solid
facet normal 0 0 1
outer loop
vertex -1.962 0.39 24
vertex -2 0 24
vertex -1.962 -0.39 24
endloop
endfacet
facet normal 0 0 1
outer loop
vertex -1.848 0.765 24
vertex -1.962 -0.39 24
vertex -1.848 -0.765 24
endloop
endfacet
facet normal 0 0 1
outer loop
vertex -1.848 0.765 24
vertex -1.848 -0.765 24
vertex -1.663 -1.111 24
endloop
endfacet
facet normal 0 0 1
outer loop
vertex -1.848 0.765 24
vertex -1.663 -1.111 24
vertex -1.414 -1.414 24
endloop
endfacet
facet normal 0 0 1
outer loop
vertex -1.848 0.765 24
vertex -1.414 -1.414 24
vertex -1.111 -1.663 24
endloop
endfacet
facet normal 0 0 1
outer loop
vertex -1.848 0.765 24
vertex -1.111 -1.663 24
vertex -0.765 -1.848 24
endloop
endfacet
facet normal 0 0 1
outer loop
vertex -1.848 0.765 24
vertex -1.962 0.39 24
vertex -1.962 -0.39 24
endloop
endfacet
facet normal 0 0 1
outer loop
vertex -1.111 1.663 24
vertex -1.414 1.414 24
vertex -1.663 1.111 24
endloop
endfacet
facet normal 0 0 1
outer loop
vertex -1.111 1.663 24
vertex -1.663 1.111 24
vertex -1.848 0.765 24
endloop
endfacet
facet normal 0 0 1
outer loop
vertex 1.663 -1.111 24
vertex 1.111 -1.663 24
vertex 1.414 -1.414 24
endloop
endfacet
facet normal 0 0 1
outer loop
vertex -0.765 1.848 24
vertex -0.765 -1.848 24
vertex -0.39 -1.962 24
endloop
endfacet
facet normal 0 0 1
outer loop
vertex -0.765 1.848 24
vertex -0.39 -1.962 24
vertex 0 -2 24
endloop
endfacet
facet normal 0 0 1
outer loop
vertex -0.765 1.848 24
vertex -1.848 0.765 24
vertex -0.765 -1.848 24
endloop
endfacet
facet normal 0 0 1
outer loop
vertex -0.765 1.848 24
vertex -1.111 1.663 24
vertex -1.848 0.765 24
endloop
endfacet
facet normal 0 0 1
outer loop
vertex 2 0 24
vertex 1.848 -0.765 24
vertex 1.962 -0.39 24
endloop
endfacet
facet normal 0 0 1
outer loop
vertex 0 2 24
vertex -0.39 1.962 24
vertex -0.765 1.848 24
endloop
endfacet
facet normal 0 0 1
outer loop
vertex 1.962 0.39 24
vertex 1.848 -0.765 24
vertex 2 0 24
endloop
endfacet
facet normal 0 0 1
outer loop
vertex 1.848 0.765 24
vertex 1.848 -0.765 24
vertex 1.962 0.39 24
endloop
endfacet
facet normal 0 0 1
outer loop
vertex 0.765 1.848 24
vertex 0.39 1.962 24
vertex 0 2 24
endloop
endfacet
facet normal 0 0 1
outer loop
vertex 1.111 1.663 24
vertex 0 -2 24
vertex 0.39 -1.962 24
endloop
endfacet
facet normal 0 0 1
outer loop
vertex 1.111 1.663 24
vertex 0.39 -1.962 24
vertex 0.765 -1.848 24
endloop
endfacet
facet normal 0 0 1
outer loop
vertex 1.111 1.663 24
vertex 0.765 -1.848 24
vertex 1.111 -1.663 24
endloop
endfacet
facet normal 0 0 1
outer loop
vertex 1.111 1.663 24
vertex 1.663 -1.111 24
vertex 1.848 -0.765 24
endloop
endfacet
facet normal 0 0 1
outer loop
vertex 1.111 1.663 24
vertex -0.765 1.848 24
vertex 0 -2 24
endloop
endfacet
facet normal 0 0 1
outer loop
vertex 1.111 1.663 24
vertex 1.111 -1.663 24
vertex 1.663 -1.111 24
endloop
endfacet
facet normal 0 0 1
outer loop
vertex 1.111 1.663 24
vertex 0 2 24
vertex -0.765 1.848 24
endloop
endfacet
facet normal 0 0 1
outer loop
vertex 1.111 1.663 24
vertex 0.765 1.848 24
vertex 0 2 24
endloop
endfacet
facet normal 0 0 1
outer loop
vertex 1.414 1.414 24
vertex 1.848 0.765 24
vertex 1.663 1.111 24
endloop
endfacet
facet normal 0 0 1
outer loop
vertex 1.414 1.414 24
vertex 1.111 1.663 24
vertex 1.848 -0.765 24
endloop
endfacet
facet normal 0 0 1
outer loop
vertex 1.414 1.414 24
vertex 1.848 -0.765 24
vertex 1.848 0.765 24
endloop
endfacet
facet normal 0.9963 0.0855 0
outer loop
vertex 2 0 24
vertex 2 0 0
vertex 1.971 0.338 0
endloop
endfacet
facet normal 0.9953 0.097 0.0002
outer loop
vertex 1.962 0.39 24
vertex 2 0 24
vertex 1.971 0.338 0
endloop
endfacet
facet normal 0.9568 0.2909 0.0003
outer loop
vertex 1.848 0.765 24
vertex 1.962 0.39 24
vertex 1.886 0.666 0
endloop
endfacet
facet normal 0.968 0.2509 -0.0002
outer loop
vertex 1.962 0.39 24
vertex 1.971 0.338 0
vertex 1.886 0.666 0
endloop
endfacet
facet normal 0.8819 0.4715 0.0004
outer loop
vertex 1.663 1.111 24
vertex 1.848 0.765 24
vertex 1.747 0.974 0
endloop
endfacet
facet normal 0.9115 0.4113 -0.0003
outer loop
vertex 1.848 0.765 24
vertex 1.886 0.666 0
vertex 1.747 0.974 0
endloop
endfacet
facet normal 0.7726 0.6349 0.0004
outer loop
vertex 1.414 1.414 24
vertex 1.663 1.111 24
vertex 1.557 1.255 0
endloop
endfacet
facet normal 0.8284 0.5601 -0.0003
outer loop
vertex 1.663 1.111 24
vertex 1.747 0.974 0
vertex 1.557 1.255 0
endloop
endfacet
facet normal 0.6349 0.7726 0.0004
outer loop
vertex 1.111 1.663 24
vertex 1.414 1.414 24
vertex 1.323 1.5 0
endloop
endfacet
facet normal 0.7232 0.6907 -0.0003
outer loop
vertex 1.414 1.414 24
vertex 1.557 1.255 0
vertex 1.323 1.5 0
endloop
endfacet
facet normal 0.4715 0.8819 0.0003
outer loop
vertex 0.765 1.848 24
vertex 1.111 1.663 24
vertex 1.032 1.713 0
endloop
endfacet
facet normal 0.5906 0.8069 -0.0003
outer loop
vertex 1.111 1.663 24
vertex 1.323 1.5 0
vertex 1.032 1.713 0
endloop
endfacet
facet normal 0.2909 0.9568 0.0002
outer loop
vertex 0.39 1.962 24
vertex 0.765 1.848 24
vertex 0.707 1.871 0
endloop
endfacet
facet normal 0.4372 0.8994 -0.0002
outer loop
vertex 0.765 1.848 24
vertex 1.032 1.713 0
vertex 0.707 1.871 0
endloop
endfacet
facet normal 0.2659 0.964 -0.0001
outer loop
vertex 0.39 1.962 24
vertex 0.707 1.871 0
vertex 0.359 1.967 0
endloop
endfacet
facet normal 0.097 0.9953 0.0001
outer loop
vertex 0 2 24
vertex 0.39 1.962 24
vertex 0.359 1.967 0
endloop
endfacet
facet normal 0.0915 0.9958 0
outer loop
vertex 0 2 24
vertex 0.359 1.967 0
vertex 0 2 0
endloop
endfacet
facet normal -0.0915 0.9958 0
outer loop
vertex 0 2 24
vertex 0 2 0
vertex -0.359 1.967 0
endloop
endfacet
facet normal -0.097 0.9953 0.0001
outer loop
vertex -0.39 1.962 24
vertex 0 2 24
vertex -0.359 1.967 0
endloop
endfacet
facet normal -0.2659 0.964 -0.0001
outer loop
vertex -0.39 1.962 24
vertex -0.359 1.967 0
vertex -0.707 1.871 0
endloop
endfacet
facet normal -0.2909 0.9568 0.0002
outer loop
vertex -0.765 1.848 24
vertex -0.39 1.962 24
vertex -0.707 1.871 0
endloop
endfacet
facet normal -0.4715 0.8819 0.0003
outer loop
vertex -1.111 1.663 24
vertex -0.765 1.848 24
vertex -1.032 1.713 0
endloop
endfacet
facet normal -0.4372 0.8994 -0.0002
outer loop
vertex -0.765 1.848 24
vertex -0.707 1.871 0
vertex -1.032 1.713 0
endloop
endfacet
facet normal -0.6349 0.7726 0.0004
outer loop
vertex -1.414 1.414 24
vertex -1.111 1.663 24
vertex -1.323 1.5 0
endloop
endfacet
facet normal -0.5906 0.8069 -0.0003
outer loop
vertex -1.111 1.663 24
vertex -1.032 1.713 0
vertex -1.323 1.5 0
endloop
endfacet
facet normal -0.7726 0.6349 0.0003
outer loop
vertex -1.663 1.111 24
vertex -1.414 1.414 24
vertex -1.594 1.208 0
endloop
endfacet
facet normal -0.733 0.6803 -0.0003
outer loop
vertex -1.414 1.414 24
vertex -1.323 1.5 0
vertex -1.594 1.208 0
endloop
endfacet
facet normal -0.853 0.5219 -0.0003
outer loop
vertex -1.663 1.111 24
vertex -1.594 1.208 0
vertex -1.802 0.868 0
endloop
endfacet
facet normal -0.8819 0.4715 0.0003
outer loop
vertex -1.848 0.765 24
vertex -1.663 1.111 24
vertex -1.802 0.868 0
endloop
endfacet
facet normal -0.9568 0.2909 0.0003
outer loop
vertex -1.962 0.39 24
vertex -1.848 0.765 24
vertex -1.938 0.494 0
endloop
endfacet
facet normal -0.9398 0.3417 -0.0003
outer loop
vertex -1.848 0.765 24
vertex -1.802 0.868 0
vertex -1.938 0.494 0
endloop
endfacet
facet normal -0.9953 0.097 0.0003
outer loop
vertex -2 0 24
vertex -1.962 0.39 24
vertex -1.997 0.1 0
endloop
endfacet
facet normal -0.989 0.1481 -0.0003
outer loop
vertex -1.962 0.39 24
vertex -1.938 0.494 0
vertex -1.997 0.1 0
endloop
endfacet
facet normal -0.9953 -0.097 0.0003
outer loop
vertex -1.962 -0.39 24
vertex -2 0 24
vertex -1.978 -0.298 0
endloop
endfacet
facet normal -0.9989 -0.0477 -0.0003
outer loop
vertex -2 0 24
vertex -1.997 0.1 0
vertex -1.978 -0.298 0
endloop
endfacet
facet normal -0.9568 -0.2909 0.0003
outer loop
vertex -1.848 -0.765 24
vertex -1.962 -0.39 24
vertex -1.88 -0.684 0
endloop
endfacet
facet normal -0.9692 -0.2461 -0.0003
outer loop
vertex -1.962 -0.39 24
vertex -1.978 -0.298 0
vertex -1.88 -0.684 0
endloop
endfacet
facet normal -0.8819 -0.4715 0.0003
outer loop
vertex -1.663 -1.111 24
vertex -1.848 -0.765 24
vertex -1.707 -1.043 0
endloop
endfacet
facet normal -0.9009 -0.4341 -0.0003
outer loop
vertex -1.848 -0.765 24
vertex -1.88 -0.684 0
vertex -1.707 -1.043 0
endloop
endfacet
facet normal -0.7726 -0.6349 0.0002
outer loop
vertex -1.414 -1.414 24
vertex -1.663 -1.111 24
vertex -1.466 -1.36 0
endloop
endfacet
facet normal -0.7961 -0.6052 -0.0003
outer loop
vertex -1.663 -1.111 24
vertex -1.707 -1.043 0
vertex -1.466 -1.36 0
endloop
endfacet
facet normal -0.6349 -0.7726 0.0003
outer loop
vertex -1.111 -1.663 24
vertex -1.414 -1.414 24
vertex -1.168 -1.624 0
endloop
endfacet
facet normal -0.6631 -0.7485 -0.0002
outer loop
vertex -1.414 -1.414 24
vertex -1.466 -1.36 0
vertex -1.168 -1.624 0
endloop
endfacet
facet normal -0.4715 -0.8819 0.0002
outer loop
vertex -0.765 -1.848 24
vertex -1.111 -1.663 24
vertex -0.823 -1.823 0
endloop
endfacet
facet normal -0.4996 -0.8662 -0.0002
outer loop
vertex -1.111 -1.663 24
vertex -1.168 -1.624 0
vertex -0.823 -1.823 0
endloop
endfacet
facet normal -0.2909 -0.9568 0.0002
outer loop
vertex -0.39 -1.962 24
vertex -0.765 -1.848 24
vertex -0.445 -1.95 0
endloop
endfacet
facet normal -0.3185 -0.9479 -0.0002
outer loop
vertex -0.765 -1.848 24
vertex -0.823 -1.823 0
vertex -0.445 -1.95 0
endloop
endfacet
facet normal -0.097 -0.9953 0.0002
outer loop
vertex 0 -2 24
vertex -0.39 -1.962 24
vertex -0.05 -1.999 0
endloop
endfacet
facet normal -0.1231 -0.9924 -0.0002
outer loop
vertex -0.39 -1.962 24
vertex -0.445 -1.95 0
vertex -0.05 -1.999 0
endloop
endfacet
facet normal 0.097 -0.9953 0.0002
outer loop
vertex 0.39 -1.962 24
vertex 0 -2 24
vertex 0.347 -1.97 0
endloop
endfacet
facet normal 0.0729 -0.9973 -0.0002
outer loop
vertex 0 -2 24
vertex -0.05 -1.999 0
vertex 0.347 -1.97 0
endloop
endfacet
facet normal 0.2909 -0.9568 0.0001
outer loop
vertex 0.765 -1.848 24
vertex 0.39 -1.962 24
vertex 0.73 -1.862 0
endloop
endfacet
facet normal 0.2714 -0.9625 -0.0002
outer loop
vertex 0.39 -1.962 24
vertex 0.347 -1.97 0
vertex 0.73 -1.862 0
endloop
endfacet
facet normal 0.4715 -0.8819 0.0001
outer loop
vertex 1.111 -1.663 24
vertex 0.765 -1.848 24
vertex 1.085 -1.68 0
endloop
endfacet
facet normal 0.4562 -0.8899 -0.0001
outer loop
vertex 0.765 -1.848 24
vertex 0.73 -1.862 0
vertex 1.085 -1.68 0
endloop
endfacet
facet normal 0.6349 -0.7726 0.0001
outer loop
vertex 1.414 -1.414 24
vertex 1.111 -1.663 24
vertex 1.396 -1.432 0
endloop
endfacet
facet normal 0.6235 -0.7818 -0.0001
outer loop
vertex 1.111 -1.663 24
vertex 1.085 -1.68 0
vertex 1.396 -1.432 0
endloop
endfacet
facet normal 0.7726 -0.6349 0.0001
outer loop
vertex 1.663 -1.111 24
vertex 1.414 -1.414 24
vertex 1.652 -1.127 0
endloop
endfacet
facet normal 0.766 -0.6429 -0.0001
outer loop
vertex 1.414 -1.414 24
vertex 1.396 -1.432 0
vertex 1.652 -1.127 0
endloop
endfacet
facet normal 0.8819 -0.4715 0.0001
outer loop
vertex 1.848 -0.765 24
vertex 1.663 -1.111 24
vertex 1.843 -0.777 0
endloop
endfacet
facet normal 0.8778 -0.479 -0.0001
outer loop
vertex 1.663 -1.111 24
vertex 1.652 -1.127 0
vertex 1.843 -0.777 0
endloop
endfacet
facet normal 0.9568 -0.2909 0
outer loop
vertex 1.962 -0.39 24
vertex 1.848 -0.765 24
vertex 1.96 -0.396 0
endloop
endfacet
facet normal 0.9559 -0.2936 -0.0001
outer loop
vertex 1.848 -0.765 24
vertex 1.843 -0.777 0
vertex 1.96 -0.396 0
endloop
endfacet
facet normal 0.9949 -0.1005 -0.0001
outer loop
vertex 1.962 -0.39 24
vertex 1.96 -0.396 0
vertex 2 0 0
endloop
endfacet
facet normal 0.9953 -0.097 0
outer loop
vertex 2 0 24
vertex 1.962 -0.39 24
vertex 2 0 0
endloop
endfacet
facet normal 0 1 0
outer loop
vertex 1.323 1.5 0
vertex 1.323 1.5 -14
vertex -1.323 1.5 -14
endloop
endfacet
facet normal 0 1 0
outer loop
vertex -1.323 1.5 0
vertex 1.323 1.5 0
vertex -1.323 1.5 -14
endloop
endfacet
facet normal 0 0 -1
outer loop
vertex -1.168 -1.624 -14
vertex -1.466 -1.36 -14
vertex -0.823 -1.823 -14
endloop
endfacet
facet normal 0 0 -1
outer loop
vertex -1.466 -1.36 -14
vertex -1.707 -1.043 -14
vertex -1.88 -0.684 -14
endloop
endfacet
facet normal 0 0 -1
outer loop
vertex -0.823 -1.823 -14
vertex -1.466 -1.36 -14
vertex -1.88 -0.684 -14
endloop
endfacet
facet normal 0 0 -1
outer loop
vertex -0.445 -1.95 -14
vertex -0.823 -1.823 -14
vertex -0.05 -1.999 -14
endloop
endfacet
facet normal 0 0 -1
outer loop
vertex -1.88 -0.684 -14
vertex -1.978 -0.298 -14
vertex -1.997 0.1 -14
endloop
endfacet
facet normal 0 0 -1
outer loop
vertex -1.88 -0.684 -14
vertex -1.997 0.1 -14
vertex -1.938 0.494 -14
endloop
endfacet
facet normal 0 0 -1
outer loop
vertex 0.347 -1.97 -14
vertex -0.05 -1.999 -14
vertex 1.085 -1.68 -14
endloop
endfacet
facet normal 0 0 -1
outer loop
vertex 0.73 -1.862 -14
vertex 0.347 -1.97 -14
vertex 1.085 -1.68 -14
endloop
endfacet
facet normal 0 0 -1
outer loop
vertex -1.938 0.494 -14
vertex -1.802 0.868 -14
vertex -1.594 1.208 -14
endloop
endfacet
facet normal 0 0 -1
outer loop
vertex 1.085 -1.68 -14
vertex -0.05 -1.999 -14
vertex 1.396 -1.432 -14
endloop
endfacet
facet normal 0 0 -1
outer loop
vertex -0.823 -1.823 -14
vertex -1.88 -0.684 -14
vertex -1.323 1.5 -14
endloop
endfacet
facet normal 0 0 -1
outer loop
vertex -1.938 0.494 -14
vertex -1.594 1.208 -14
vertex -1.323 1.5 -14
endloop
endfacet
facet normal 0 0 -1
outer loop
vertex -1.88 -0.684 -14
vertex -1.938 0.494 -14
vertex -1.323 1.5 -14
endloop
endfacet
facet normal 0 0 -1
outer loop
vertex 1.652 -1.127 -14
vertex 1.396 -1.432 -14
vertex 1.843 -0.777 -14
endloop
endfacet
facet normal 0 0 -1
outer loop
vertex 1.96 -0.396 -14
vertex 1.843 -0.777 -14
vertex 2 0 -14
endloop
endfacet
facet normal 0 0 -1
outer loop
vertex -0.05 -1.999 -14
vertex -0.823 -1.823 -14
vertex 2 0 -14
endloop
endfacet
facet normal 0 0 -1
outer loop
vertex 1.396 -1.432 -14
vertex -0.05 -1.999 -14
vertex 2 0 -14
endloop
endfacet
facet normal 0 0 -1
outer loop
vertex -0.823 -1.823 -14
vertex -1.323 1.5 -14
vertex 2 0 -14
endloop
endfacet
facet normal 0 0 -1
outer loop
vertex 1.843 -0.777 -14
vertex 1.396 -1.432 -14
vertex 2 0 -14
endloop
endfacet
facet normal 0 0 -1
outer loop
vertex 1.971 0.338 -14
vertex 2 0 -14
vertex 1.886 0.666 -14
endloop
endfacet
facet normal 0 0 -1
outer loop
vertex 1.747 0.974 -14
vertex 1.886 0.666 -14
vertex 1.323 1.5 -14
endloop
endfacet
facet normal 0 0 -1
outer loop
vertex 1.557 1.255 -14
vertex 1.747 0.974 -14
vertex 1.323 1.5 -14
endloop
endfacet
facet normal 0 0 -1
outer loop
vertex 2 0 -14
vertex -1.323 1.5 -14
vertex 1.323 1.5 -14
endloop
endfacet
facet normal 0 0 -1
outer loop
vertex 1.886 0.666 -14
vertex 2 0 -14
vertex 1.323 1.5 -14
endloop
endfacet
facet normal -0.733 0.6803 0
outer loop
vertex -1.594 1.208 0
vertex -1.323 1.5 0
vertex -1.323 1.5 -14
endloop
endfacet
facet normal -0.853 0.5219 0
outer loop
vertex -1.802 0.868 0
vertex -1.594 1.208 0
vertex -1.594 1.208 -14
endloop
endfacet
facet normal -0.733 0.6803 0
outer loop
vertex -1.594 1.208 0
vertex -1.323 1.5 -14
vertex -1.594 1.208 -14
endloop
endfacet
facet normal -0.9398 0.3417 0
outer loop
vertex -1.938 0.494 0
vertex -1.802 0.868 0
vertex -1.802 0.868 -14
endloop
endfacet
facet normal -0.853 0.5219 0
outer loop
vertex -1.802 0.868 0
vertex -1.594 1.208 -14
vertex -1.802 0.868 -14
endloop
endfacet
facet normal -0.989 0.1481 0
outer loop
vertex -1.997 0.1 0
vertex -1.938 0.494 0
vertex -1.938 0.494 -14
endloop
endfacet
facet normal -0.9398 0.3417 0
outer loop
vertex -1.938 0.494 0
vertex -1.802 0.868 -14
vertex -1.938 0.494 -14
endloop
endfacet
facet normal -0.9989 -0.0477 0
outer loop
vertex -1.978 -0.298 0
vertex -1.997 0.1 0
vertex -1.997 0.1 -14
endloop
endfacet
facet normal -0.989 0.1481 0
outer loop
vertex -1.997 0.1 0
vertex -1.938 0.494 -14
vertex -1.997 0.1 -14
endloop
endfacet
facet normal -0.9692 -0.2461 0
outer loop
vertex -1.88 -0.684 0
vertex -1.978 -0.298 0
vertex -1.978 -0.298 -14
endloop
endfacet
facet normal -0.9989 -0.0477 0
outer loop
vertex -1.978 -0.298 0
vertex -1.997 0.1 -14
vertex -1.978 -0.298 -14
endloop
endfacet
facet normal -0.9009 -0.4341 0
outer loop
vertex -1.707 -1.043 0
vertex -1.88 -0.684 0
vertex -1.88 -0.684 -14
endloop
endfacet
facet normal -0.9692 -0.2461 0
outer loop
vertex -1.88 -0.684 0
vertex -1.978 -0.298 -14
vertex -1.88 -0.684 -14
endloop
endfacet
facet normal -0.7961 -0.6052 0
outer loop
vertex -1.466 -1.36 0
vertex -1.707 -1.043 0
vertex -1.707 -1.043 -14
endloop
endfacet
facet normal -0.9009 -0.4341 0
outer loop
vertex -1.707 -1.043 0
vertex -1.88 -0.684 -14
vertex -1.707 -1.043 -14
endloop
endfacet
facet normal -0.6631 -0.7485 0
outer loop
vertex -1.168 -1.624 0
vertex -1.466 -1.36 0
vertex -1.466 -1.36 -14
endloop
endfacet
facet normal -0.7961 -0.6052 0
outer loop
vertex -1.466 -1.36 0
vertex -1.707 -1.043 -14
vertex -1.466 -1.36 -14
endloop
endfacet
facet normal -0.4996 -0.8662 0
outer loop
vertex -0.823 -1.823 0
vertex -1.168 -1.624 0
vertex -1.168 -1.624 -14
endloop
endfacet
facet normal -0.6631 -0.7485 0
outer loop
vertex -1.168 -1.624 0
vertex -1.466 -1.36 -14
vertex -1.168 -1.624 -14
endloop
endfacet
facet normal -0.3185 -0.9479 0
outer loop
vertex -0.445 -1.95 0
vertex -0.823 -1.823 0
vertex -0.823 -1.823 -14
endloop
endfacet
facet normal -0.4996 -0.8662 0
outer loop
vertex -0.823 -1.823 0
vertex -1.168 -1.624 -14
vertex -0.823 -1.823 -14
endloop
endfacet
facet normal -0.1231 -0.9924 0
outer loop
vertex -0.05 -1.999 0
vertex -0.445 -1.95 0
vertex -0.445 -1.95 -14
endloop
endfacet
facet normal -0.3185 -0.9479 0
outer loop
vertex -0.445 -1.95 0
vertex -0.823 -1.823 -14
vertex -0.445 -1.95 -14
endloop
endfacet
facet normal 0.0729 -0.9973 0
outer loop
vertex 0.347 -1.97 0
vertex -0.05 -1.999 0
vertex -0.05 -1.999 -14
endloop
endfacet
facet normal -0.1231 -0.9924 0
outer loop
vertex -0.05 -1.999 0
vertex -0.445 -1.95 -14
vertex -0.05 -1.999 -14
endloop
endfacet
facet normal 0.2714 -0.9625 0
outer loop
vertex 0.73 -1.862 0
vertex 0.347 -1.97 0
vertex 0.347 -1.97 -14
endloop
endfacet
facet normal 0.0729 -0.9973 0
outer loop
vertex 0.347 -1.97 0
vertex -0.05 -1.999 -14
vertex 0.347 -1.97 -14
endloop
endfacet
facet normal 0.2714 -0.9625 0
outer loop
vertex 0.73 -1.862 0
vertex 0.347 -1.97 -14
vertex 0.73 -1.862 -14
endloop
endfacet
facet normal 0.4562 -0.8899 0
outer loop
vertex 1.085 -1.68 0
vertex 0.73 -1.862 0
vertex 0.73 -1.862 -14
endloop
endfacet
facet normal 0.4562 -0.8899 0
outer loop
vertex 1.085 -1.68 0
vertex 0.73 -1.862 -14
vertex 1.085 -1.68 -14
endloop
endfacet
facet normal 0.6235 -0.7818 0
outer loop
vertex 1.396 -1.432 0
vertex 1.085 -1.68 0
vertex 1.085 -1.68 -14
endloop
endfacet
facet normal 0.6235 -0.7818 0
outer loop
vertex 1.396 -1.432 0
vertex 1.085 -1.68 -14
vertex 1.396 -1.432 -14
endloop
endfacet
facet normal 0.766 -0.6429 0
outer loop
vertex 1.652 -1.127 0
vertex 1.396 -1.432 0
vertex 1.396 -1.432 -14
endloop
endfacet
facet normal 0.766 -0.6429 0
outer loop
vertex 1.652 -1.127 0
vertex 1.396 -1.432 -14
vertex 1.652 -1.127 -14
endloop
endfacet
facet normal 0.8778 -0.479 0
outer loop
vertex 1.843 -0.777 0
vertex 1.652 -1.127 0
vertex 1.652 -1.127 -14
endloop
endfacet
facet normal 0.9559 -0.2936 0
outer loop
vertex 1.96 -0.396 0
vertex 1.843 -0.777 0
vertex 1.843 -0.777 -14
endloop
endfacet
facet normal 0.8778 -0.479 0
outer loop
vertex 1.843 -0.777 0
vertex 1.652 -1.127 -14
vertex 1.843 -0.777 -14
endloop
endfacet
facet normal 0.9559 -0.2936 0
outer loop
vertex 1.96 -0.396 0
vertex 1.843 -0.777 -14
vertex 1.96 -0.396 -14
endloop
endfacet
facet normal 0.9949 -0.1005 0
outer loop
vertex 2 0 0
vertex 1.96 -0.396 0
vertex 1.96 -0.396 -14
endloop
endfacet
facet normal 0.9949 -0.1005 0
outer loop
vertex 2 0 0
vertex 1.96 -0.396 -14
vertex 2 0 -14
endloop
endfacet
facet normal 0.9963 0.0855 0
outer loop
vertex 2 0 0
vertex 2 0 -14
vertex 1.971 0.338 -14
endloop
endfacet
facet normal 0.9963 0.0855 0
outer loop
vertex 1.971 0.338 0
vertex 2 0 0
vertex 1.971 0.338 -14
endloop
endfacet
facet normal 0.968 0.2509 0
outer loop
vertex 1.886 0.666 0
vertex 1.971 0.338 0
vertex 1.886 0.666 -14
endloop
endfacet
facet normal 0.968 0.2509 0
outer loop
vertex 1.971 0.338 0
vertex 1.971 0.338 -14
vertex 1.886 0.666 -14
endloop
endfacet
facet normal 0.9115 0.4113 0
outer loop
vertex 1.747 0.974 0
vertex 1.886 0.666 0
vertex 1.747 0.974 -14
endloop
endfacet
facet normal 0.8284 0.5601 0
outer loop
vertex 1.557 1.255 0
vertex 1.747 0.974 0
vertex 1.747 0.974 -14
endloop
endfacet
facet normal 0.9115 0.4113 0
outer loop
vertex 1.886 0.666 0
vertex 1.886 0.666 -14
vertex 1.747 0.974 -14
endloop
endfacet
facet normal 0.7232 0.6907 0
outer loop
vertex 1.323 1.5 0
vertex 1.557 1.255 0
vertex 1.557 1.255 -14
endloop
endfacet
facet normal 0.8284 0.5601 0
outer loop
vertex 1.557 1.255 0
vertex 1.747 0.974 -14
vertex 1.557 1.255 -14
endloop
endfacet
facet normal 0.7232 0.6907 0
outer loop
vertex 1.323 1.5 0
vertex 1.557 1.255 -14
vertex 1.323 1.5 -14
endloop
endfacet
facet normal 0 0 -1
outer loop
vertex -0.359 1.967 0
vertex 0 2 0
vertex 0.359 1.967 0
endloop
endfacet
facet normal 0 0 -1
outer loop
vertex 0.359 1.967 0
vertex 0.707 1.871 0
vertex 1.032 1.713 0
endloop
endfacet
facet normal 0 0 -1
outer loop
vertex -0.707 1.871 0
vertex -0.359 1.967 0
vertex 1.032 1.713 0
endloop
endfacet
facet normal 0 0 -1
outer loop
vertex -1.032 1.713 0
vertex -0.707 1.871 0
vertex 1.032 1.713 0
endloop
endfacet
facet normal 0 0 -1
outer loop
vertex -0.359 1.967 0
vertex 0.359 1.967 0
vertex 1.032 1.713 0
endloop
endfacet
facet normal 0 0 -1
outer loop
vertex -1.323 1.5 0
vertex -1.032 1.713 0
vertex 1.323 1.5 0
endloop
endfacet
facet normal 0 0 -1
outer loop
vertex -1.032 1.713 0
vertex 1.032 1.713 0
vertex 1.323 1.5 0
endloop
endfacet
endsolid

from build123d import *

# Parameters (mm, degrees)
SKETCH1_R           = 2
BOSS_EXTRUDE2_DEPTH = 24
BOSS_EXTRUDE3_START = -14
BOSS_EXTRUDE3_DEPTH = 14


with BuildPart() as part:
    # Sketch1 → Boss-Extrude2 (new body)
    with BuildSketch(Plane.XY):
        Circle(SKETCH1_R)
    extrude(amount=BOSS_EXTRUDE2_DEPTH)

    # Sketch1<4> → Boss-Extrude3 (add)
    with BuildSketch(Plane.XY.offset(BOSS_EXTRUDE3_START)):
        with BuildLine():
            Line((1.322875656, 1.5), (-1.322875656, 1.5))
            ThreePointArc((-1.322875656, 1.5), (-0.822875656, -1.822875656), (2, 0))
            ThreePointArc((2, 0), (1.822875656, 0.822875656), (1.322875656, 1.5))
        make_face()
    extrude(amount=BOSS_EXTRUDE3_DEPTH)


solid = part.part
